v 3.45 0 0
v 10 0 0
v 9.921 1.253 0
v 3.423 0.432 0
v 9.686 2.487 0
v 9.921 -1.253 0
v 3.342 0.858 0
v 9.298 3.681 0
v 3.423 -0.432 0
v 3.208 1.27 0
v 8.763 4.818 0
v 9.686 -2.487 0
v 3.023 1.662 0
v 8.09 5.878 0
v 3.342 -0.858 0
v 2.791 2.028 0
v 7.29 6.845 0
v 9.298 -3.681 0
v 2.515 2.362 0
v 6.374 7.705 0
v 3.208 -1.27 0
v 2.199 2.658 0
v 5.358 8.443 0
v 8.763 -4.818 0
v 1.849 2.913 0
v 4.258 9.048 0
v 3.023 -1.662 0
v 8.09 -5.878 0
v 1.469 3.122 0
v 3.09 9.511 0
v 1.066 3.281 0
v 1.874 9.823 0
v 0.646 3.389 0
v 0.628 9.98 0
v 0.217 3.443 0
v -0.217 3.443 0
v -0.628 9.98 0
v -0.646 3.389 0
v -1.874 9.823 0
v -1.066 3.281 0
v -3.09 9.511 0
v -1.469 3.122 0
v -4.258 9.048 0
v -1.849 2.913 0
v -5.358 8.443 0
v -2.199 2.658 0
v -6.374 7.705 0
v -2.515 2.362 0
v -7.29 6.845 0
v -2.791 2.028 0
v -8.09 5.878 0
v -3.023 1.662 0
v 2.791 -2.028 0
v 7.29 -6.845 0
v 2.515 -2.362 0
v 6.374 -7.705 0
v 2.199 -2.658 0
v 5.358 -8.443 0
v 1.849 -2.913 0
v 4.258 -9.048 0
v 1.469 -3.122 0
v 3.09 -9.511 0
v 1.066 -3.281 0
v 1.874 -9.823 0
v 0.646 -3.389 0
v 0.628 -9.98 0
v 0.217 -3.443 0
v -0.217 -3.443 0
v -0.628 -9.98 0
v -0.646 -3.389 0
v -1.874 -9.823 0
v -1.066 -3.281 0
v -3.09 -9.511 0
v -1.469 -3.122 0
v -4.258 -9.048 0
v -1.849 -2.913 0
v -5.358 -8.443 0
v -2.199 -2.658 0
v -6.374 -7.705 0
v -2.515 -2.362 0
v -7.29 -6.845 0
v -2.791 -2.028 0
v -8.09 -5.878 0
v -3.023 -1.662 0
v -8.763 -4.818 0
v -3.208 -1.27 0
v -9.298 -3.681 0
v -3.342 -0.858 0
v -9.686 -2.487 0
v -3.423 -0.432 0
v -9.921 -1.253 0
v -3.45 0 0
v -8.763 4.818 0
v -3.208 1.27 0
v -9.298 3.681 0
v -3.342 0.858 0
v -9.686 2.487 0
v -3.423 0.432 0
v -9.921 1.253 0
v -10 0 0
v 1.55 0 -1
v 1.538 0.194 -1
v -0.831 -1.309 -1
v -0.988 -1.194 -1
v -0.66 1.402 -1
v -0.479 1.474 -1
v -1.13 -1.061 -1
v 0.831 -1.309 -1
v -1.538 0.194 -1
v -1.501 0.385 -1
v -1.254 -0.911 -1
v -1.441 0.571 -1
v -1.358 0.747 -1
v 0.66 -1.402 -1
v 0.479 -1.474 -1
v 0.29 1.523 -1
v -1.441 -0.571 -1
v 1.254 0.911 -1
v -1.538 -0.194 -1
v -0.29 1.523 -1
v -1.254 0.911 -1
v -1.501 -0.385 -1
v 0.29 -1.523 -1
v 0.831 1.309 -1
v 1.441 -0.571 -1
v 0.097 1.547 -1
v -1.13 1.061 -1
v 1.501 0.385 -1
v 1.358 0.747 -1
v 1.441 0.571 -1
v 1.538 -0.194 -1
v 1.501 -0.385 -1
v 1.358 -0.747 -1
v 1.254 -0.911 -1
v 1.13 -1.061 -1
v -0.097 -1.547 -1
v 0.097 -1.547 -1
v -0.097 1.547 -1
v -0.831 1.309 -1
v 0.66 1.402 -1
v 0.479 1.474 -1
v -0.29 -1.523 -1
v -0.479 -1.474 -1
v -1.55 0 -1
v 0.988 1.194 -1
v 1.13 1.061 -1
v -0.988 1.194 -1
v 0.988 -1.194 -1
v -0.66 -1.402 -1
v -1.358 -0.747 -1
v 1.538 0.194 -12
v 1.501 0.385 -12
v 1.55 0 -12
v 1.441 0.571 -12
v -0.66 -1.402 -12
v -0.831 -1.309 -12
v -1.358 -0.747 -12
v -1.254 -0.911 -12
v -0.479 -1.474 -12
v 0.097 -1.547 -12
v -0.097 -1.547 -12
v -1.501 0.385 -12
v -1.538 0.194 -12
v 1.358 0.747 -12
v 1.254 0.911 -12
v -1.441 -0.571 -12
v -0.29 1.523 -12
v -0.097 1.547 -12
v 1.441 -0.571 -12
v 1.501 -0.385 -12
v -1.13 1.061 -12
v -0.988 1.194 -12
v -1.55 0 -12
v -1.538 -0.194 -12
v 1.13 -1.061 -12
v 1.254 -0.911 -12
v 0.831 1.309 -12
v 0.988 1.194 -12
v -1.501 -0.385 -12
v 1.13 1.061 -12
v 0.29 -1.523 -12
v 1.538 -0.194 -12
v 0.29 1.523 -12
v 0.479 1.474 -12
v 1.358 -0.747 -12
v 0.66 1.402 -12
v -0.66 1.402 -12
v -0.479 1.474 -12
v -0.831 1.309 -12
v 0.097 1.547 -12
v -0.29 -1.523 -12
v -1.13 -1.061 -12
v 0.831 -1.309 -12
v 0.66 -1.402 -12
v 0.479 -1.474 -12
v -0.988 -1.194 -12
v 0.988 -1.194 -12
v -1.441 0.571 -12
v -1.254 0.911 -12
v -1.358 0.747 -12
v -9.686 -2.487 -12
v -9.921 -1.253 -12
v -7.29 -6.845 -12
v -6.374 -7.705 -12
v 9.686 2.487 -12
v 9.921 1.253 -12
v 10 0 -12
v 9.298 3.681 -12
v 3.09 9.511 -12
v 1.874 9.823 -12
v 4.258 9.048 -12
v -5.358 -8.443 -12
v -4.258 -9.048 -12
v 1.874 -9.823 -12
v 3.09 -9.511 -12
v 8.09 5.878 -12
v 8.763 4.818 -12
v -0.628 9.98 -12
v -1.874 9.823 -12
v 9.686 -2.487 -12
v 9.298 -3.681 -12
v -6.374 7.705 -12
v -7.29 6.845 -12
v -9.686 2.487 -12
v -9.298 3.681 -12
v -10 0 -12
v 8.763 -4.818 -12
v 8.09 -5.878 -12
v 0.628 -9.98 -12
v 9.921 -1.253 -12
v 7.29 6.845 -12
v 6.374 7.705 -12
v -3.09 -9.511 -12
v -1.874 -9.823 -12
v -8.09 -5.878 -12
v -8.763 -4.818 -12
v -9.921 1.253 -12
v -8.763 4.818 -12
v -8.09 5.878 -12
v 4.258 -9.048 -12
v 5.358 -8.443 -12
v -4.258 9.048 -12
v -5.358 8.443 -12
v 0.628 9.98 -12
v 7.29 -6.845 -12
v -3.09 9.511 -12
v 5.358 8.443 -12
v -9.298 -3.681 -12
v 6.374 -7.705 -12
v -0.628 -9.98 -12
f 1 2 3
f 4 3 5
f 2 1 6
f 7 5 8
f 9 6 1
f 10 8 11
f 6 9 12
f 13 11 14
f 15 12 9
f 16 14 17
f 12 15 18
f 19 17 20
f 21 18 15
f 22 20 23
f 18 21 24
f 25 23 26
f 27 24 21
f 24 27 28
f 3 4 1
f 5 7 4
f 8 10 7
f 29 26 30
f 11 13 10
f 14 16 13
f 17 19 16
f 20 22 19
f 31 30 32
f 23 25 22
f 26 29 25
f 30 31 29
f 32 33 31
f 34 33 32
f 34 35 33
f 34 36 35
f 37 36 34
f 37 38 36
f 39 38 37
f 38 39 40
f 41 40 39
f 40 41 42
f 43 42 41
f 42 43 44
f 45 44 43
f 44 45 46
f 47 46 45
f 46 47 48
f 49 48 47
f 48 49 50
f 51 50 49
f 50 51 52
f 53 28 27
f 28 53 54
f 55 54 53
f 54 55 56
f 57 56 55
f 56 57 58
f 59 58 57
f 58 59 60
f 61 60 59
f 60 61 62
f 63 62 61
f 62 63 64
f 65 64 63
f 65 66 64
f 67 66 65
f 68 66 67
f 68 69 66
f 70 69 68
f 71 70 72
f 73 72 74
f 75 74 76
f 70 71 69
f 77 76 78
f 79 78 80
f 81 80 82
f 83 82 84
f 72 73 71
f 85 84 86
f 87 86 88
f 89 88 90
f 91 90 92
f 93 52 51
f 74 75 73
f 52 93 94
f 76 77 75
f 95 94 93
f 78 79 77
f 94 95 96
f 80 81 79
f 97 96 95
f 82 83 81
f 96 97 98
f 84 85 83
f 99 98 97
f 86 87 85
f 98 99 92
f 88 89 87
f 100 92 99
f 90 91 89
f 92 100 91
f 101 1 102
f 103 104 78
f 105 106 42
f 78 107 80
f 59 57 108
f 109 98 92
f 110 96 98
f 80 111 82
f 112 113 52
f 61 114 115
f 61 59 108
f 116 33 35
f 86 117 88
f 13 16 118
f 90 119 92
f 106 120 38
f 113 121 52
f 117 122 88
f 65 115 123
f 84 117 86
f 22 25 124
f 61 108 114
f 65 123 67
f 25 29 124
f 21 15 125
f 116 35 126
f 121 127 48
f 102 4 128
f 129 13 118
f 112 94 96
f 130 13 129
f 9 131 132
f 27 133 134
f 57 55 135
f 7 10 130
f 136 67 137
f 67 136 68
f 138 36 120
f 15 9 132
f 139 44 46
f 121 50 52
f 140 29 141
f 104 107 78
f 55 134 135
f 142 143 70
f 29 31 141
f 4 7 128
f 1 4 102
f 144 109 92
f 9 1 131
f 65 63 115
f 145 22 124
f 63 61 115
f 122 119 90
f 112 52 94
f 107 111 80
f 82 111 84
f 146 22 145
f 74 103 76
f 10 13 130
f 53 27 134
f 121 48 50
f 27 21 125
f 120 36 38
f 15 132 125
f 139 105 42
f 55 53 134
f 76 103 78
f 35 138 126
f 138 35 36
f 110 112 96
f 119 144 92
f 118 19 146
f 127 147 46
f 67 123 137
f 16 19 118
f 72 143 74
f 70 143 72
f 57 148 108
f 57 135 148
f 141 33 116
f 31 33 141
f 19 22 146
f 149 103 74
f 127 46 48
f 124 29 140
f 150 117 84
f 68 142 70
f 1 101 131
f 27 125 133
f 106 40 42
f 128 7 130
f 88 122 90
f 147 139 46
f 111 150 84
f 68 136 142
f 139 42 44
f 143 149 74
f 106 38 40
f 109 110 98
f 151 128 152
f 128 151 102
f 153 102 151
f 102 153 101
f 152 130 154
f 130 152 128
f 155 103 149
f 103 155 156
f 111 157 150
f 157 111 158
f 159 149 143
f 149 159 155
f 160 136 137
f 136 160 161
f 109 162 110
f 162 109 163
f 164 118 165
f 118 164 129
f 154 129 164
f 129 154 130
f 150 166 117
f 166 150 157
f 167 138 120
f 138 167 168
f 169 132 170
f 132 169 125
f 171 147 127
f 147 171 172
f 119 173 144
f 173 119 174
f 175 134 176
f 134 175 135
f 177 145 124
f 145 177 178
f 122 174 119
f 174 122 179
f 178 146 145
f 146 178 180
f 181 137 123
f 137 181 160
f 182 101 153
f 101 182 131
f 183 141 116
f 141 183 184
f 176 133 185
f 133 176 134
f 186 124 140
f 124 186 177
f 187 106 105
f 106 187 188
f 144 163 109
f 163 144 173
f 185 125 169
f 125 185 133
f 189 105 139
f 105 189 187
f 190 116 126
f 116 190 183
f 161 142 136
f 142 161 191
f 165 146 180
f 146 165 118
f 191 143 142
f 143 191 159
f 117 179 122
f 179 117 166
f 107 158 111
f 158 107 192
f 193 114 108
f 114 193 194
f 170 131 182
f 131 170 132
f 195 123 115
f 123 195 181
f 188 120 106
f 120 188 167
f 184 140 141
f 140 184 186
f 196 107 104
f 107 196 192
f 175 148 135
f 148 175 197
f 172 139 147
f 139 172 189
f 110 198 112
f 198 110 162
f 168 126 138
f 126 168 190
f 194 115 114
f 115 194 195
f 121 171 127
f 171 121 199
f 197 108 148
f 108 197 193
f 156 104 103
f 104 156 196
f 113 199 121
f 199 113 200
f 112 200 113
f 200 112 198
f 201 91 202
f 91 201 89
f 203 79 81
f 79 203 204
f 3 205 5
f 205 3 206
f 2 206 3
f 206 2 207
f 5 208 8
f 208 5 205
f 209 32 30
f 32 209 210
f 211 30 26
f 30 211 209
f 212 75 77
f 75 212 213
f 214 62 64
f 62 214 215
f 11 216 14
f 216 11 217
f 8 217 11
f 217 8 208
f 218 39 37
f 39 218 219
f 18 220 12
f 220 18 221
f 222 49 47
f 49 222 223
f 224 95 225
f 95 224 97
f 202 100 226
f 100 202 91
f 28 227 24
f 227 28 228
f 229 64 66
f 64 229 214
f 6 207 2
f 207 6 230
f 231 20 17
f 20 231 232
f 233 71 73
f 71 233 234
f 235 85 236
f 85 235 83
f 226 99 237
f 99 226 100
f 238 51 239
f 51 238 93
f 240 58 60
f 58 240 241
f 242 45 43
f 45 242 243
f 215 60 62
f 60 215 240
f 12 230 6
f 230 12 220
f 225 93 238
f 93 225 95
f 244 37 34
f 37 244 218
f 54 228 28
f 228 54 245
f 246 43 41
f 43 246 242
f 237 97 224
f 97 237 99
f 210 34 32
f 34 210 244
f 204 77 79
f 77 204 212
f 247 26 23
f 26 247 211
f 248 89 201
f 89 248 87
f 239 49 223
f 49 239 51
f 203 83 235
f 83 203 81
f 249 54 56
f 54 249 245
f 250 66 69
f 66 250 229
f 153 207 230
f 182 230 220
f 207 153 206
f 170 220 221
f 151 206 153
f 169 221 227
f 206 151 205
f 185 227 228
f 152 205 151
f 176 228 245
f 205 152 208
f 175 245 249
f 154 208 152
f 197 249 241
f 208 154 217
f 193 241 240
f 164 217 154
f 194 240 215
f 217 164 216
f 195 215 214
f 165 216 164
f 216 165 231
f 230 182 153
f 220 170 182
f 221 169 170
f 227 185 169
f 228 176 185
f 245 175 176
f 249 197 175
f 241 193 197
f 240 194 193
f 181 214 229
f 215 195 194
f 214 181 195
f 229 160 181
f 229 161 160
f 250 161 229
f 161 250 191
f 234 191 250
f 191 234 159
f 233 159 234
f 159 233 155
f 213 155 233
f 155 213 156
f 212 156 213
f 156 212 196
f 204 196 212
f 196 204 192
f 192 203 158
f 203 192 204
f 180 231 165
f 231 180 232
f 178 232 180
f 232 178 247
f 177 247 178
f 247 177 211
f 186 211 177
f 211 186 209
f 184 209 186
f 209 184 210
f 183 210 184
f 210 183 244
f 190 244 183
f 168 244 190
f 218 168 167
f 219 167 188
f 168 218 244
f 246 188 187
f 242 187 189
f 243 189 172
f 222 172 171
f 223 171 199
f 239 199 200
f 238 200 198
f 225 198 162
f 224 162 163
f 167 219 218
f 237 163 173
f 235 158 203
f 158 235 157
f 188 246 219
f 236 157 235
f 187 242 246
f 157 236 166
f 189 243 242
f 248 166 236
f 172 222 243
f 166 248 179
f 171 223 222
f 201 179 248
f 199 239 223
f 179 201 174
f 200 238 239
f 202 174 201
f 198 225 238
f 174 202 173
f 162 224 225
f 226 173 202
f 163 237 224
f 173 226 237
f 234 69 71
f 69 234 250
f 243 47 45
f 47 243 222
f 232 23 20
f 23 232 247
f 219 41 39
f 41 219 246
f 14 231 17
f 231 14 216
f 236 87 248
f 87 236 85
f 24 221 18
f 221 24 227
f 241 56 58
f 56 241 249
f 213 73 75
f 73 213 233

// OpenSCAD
$fn = 50;

difference() {
	union() {
		translate(v = [0, 0, -12.0]) {
			cylinder(h = 12, r = 10.0);
		}
	}
	union() {
		translate(v = [0, 0, 0]) {
			rotate(a = [0, 0, 0]) {
				difference() {
					union() {
						translate(v = [0, 0, -15.0]) {
							cylinder(h = 15, r = 1.25);
						}
						translate(v = [0, 0, -1.0]) {
							cylinder(h = 1.0, r1 = 1.55, r2 = 3.45);
						}
						translate(v = [0, 0, -15.0]) {
							cylinder(h = 15, r = 1.55);
						}
						translate(v = [0, 0, -15.0]) {
							cylinder(h = 15, r = 1.25);
						}
					}
					union();
				}
			}
		}
	}
}
